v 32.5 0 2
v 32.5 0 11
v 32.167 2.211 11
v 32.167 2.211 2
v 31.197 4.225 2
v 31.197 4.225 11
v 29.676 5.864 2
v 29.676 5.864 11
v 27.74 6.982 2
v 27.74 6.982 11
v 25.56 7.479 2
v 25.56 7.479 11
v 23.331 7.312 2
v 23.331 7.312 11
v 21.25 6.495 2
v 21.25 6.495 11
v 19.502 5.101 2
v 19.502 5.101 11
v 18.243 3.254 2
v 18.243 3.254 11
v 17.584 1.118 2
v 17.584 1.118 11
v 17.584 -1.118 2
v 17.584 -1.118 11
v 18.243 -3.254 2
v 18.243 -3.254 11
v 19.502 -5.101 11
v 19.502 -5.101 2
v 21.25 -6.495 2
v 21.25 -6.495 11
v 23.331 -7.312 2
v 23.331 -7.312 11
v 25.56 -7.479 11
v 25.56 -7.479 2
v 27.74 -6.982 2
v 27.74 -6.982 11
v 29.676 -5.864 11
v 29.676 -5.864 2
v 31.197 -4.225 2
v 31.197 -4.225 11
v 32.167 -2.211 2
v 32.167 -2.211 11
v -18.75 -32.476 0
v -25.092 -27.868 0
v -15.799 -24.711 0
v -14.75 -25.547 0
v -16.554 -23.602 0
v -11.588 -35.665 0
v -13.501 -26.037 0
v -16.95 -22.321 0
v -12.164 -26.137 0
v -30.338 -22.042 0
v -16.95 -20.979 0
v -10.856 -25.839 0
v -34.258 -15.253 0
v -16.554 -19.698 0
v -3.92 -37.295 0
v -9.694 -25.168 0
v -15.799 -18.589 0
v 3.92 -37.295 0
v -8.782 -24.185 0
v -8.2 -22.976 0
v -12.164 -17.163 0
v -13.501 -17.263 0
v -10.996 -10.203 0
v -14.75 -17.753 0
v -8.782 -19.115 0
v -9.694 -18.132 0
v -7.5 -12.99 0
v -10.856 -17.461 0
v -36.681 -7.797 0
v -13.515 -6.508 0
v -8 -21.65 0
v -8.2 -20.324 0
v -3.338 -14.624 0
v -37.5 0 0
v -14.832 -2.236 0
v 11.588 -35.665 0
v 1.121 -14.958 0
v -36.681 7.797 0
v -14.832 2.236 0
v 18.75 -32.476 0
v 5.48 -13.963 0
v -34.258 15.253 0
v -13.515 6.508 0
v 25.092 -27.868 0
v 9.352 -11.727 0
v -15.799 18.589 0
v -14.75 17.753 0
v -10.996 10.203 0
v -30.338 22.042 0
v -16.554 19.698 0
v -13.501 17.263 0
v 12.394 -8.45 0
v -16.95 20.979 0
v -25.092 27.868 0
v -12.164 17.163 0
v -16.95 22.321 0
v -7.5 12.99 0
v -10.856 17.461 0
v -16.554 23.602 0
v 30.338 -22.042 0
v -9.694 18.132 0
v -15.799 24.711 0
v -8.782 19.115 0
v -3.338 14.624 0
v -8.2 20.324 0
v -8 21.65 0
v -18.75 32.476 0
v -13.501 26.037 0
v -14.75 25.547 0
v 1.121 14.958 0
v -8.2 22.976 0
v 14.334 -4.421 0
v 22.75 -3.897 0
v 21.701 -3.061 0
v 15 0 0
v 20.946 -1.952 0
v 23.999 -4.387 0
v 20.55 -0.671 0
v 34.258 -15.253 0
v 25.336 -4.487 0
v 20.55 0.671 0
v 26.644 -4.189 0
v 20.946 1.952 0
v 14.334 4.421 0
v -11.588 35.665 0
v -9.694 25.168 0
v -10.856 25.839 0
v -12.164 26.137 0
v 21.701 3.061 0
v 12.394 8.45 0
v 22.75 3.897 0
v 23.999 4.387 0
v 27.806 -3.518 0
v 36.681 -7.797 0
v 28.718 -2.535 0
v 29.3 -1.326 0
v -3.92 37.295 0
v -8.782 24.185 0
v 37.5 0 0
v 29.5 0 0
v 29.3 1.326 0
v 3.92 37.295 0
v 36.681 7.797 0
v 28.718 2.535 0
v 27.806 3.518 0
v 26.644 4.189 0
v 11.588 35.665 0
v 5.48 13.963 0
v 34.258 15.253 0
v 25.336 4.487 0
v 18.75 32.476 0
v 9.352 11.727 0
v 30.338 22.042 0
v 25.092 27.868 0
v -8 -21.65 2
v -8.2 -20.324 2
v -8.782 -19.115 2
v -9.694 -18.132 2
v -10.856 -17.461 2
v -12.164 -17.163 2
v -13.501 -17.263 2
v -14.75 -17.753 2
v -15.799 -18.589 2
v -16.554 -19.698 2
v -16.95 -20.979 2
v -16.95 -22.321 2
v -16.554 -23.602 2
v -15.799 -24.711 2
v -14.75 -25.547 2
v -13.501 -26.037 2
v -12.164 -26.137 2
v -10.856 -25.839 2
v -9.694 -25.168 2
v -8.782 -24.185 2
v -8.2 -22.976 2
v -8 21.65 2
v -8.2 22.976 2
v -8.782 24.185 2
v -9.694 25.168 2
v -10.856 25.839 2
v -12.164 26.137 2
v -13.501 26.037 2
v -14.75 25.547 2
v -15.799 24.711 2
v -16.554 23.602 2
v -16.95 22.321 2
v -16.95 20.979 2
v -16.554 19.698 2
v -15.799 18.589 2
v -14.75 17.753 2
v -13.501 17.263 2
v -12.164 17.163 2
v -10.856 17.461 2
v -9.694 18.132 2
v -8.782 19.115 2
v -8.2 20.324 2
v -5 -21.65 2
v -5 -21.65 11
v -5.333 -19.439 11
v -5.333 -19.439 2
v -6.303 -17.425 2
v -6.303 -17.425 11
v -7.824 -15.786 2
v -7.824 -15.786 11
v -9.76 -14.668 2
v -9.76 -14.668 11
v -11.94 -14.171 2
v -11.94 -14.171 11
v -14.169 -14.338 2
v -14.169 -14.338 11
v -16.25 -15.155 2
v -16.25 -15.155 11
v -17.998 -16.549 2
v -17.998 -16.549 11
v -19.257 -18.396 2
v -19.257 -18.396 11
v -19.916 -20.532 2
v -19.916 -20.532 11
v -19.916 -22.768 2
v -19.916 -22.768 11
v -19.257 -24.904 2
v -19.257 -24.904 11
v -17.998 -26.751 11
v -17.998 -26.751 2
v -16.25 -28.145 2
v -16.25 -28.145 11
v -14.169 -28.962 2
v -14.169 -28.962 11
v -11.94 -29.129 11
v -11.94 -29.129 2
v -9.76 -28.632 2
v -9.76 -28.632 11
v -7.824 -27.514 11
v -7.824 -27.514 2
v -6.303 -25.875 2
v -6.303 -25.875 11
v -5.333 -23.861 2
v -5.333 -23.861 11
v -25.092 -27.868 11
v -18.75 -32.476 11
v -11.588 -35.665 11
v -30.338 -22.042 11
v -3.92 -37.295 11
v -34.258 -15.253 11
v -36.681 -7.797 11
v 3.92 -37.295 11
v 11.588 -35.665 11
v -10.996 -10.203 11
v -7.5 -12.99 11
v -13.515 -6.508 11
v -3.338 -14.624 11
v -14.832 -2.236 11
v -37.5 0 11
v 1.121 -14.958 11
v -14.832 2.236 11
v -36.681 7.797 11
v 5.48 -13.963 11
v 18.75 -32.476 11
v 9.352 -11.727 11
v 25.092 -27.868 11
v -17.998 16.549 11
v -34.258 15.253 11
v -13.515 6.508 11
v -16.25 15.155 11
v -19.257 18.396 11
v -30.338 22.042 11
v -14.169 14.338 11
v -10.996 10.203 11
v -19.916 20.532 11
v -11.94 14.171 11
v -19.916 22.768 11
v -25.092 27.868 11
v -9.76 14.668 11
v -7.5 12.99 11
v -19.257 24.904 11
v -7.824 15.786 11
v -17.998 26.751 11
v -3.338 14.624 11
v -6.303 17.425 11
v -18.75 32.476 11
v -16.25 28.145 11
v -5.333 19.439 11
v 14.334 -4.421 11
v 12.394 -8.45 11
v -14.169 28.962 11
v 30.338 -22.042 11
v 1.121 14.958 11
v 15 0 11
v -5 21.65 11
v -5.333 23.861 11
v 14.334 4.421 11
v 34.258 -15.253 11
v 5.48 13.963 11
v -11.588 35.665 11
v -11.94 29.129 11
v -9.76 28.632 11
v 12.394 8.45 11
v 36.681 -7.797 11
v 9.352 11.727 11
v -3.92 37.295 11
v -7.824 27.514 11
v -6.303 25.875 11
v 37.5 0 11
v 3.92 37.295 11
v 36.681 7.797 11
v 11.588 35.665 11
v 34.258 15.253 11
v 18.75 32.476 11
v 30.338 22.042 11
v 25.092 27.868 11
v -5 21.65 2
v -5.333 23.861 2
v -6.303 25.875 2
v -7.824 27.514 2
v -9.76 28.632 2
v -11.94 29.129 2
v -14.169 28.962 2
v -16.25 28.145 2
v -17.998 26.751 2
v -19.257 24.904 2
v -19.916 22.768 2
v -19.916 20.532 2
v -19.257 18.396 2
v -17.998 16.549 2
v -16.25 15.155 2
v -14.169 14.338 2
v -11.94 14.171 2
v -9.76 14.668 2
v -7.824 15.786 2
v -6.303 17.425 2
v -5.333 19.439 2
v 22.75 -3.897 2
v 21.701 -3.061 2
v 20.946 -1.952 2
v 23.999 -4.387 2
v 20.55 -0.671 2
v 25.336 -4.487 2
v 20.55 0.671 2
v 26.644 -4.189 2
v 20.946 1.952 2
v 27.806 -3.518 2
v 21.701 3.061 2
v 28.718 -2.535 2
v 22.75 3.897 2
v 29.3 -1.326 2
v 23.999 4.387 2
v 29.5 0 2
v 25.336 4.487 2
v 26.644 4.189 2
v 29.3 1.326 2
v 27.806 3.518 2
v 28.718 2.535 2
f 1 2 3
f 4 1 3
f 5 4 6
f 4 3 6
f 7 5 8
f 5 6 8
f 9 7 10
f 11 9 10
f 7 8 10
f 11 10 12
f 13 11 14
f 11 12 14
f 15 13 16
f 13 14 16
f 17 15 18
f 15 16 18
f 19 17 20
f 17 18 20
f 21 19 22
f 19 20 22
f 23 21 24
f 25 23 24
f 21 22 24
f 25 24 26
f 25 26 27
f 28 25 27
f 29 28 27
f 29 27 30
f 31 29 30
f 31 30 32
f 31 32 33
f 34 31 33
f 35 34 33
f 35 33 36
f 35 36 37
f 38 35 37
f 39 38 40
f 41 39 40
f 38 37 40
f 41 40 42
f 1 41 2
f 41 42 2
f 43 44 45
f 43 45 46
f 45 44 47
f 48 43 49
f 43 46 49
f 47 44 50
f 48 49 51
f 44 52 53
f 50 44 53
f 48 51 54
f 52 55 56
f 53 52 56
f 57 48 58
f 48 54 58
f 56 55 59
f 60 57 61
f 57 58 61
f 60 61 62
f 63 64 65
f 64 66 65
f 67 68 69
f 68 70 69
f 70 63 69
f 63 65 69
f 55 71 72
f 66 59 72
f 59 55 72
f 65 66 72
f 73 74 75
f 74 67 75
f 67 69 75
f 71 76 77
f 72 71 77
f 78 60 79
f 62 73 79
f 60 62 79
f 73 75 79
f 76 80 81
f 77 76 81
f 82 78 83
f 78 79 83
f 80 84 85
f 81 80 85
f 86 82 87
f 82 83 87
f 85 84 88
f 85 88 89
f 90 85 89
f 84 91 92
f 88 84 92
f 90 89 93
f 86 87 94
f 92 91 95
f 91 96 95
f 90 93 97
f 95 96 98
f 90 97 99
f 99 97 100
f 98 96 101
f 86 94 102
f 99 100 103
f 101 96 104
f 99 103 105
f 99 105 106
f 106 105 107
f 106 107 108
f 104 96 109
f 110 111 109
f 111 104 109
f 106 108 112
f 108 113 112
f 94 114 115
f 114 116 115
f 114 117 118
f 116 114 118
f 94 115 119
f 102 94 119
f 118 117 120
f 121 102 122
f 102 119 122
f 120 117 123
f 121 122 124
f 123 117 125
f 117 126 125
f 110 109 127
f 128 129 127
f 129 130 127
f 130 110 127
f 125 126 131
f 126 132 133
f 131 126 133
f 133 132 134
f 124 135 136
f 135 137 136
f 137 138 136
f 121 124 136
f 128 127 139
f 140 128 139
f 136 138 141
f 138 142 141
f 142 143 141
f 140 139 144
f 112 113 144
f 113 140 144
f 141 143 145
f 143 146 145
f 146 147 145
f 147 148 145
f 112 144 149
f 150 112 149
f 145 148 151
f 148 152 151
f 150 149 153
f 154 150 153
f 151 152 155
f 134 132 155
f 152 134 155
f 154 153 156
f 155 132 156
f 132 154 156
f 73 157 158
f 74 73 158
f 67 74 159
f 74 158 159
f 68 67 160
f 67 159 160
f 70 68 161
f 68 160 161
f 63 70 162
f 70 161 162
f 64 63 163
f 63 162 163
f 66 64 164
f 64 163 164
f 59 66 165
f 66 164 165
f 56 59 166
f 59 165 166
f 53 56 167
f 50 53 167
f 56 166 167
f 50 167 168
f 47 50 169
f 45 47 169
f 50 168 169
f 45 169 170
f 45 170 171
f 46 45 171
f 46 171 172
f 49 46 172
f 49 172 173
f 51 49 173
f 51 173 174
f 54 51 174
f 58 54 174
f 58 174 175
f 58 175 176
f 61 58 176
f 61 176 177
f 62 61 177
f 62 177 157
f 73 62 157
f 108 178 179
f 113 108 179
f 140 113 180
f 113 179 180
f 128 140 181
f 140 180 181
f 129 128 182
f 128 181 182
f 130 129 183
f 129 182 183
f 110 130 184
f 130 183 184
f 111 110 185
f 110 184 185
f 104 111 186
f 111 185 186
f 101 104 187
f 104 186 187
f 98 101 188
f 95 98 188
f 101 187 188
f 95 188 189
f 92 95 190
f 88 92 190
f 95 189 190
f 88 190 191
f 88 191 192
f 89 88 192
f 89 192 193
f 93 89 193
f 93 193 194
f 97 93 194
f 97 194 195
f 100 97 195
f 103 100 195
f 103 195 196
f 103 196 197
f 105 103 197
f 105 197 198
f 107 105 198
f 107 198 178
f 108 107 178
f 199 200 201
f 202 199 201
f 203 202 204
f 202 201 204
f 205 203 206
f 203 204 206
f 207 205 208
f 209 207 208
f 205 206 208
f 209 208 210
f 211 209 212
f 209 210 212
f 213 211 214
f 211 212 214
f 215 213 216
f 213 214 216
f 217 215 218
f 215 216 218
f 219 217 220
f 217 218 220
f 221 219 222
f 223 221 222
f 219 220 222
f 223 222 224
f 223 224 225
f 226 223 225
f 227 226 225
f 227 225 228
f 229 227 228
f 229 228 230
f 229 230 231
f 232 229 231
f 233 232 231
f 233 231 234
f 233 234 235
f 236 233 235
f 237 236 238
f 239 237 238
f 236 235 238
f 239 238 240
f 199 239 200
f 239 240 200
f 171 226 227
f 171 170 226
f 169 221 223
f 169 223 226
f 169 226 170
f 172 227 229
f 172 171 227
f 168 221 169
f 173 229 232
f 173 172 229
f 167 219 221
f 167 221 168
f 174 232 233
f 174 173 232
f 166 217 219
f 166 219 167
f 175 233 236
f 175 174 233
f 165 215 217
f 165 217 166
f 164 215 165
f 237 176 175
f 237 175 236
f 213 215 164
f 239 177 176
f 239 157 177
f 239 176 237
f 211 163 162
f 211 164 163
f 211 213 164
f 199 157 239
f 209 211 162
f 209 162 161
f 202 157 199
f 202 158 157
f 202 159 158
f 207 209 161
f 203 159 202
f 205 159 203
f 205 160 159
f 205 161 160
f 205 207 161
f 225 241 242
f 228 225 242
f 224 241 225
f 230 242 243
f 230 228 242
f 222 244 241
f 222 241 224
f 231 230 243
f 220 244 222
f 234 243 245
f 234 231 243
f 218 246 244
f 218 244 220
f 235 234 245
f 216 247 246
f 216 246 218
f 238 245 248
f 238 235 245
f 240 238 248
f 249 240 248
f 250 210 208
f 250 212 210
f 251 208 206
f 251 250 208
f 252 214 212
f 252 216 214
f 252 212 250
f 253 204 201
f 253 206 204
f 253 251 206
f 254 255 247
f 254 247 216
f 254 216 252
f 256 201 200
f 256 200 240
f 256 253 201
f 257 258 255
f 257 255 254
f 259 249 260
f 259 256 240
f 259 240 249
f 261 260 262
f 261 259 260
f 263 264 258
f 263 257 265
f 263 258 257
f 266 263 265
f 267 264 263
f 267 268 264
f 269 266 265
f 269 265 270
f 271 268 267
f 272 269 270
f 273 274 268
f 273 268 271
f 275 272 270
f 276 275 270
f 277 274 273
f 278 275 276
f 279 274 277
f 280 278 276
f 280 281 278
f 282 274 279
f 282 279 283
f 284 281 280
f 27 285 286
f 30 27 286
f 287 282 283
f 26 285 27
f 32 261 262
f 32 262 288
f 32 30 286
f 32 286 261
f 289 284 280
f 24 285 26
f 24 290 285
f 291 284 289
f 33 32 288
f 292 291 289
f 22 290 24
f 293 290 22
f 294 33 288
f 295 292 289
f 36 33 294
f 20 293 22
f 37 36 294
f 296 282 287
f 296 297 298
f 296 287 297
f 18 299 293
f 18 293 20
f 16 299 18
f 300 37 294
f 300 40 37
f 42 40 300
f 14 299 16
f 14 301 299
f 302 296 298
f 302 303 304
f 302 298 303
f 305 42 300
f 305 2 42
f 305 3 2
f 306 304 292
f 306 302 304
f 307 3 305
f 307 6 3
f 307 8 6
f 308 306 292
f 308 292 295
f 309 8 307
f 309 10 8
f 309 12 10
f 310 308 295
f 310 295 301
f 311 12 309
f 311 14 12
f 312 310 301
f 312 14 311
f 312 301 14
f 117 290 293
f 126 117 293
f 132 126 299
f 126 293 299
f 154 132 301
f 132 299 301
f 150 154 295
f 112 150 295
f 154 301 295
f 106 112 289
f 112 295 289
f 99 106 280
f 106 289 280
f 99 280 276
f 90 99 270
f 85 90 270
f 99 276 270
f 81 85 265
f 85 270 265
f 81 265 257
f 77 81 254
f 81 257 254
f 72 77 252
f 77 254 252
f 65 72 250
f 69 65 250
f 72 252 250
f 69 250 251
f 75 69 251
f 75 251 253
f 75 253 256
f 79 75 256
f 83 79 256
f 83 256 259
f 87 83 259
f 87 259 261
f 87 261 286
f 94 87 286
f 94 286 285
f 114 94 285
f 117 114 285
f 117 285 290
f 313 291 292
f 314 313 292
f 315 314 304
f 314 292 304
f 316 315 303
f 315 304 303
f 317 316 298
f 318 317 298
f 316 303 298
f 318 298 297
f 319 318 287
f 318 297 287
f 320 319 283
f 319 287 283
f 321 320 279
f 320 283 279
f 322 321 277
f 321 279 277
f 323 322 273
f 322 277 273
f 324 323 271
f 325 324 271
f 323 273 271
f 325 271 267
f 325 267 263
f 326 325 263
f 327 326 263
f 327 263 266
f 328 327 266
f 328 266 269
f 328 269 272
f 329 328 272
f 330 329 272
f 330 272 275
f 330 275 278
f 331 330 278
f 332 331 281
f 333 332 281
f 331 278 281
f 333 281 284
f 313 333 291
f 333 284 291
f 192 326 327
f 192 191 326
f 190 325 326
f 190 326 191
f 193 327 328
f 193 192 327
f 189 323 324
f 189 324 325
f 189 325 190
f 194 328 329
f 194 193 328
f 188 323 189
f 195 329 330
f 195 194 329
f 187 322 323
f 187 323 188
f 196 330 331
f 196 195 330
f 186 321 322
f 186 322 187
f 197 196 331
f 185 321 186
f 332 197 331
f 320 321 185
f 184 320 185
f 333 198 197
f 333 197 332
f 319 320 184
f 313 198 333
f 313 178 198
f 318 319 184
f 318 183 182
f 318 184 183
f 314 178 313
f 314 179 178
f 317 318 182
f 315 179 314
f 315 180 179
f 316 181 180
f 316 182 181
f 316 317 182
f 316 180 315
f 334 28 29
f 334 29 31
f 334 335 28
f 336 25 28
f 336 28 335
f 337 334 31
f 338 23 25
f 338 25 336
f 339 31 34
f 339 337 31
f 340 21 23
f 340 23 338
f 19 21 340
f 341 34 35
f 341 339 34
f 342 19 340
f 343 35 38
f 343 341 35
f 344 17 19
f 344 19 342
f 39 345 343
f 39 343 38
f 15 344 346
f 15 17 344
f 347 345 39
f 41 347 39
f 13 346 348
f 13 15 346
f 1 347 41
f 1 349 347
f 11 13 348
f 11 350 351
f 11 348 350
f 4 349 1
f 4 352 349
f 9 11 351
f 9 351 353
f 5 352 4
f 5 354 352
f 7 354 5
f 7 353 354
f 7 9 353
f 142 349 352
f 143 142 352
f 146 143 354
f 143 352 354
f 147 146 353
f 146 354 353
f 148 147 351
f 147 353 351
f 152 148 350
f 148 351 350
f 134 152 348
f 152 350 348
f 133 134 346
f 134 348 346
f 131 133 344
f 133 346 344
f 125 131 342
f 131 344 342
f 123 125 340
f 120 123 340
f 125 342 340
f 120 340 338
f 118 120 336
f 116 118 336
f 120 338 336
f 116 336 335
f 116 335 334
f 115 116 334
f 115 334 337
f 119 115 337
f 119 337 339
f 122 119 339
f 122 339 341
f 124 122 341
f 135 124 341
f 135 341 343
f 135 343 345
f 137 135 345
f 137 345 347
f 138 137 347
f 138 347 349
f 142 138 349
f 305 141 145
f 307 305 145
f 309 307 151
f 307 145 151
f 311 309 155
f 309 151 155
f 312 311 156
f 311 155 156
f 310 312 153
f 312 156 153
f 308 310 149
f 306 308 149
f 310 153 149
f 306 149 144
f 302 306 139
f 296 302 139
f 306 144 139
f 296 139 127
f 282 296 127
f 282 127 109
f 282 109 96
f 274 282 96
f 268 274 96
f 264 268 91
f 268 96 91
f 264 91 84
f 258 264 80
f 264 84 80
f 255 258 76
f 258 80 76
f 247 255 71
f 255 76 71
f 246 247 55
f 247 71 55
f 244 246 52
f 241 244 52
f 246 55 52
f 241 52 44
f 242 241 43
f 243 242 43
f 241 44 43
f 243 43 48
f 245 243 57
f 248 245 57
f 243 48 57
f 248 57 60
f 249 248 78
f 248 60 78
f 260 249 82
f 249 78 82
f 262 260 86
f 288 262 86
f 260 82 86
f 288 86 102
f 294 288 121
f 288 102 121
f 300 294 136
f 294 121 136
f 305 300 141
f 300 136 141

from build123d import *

# Parameters (mm, degrees)
SKETCH_1_R     = 37.5
PAD_1_DEPTH    = 11
SKETCH_2_R     = 15
POCKET_2_DEPTH = 11.001
SKETCH_3_R     = 4.5
POCKET_3_DEPTH = 11.001
SKETCH_4_R     = 4.5
POCKET_4_DEPTH = 11.001
SKETCH_5_R     = 4.5
POCKET_5_DEPTH = 11.001
SKETCH_6_R     = 7.5
POCKET_6_DEPTH = 9
SKETCH_7_R     = 7.5
POCKET_7_DEPTH = 9
SKETCH_8_R     = 7.5
POCKET_8_DEPTH = 9


with BuildPart() as part:
    # Sketch_1 → Pad_1 (new body)
    with BuildSketch(Plane.XY):
        Circle(SKETCH_1_R)
    extrude(amount=PAD_1_DEPTH)

    # Sketch_2 (on Face3 of Pad_1) → Pocket_2 (cut, through all)
    with BuildSketch(Plane.XY.offset(11)):
        Circle(SKETCH_2_R)
    extrude(amount=-POCKET_2_DEPTH, mode=Mode.SUBTRACT)

    # Sketch_3 (on Face3 of Pocket_2) → Pocket_3 (cut, through all)
    with BuildSketch(Plane.XY.offset(11)):
        with Locations((25, 0)):
            Circle(SKETCH_3_R)
    extrude(amount=-POCKET_3_DEPTH, mode=Mode.SUBTRACT)

    # Sketch_4 (on Face3 of Pocket_3) → Pocket_4 (cut, through all)
    with BuildSketch(Plane.XY.offset(11)):
        with Locations((-12.5, 21.65)):
            Circle(SKETCH_4_R)
    extrude(amount=-POCKET_4_DEPTH, mode=Mode.SUBTRACT)

    # Sketch_5 (on Face3 of Pocket_4) → Pocket_5 (cut, through all)
    with BuildSketch(Plane.XY.offset(11)):
        with Locations((-12.5, -21.65)):
            Circle(SKETCH_5_R)
    extrude(amount=-POCKET_5_DEPTH, mode=Mode.SUBTRACT)

    # Sketch_6 (on Face3 of Pocket_5) → Pocket_6 (cut)
    with BuildSketch(Plane.XY.offset(11)):
        with Locations((25, 0)):
            Circle(SKETCH_6_R)
    extrude(amount=-POCKET_6_DEPTH, mode=Mode.SUBTRACT)

    # Sketch_7 (on Face3 of Pocket_6) → Pocket_7 (cut)
    with BuildSketch(Plane.XY.offset(11)):
        with Locations((-12.5, 21.65)):
            Circle(SKETCH_7_R)
    extrude(amount=-POCKET_7_DEPTH, mode=Mode.SUBTRACT)

    # Sketch_8 (on Face3 of Pocket_7) → Pocket_8 (cut)
    with BuildSketch(Plane.XY.offset(11)):
        with Locations((-12.5, -21.65)):
            Circle(SKETCH_8_R)
    extrude(amount=-POCKET_8_DEPTH, mode=Mode.SUBTRACT)


solid = part.part
